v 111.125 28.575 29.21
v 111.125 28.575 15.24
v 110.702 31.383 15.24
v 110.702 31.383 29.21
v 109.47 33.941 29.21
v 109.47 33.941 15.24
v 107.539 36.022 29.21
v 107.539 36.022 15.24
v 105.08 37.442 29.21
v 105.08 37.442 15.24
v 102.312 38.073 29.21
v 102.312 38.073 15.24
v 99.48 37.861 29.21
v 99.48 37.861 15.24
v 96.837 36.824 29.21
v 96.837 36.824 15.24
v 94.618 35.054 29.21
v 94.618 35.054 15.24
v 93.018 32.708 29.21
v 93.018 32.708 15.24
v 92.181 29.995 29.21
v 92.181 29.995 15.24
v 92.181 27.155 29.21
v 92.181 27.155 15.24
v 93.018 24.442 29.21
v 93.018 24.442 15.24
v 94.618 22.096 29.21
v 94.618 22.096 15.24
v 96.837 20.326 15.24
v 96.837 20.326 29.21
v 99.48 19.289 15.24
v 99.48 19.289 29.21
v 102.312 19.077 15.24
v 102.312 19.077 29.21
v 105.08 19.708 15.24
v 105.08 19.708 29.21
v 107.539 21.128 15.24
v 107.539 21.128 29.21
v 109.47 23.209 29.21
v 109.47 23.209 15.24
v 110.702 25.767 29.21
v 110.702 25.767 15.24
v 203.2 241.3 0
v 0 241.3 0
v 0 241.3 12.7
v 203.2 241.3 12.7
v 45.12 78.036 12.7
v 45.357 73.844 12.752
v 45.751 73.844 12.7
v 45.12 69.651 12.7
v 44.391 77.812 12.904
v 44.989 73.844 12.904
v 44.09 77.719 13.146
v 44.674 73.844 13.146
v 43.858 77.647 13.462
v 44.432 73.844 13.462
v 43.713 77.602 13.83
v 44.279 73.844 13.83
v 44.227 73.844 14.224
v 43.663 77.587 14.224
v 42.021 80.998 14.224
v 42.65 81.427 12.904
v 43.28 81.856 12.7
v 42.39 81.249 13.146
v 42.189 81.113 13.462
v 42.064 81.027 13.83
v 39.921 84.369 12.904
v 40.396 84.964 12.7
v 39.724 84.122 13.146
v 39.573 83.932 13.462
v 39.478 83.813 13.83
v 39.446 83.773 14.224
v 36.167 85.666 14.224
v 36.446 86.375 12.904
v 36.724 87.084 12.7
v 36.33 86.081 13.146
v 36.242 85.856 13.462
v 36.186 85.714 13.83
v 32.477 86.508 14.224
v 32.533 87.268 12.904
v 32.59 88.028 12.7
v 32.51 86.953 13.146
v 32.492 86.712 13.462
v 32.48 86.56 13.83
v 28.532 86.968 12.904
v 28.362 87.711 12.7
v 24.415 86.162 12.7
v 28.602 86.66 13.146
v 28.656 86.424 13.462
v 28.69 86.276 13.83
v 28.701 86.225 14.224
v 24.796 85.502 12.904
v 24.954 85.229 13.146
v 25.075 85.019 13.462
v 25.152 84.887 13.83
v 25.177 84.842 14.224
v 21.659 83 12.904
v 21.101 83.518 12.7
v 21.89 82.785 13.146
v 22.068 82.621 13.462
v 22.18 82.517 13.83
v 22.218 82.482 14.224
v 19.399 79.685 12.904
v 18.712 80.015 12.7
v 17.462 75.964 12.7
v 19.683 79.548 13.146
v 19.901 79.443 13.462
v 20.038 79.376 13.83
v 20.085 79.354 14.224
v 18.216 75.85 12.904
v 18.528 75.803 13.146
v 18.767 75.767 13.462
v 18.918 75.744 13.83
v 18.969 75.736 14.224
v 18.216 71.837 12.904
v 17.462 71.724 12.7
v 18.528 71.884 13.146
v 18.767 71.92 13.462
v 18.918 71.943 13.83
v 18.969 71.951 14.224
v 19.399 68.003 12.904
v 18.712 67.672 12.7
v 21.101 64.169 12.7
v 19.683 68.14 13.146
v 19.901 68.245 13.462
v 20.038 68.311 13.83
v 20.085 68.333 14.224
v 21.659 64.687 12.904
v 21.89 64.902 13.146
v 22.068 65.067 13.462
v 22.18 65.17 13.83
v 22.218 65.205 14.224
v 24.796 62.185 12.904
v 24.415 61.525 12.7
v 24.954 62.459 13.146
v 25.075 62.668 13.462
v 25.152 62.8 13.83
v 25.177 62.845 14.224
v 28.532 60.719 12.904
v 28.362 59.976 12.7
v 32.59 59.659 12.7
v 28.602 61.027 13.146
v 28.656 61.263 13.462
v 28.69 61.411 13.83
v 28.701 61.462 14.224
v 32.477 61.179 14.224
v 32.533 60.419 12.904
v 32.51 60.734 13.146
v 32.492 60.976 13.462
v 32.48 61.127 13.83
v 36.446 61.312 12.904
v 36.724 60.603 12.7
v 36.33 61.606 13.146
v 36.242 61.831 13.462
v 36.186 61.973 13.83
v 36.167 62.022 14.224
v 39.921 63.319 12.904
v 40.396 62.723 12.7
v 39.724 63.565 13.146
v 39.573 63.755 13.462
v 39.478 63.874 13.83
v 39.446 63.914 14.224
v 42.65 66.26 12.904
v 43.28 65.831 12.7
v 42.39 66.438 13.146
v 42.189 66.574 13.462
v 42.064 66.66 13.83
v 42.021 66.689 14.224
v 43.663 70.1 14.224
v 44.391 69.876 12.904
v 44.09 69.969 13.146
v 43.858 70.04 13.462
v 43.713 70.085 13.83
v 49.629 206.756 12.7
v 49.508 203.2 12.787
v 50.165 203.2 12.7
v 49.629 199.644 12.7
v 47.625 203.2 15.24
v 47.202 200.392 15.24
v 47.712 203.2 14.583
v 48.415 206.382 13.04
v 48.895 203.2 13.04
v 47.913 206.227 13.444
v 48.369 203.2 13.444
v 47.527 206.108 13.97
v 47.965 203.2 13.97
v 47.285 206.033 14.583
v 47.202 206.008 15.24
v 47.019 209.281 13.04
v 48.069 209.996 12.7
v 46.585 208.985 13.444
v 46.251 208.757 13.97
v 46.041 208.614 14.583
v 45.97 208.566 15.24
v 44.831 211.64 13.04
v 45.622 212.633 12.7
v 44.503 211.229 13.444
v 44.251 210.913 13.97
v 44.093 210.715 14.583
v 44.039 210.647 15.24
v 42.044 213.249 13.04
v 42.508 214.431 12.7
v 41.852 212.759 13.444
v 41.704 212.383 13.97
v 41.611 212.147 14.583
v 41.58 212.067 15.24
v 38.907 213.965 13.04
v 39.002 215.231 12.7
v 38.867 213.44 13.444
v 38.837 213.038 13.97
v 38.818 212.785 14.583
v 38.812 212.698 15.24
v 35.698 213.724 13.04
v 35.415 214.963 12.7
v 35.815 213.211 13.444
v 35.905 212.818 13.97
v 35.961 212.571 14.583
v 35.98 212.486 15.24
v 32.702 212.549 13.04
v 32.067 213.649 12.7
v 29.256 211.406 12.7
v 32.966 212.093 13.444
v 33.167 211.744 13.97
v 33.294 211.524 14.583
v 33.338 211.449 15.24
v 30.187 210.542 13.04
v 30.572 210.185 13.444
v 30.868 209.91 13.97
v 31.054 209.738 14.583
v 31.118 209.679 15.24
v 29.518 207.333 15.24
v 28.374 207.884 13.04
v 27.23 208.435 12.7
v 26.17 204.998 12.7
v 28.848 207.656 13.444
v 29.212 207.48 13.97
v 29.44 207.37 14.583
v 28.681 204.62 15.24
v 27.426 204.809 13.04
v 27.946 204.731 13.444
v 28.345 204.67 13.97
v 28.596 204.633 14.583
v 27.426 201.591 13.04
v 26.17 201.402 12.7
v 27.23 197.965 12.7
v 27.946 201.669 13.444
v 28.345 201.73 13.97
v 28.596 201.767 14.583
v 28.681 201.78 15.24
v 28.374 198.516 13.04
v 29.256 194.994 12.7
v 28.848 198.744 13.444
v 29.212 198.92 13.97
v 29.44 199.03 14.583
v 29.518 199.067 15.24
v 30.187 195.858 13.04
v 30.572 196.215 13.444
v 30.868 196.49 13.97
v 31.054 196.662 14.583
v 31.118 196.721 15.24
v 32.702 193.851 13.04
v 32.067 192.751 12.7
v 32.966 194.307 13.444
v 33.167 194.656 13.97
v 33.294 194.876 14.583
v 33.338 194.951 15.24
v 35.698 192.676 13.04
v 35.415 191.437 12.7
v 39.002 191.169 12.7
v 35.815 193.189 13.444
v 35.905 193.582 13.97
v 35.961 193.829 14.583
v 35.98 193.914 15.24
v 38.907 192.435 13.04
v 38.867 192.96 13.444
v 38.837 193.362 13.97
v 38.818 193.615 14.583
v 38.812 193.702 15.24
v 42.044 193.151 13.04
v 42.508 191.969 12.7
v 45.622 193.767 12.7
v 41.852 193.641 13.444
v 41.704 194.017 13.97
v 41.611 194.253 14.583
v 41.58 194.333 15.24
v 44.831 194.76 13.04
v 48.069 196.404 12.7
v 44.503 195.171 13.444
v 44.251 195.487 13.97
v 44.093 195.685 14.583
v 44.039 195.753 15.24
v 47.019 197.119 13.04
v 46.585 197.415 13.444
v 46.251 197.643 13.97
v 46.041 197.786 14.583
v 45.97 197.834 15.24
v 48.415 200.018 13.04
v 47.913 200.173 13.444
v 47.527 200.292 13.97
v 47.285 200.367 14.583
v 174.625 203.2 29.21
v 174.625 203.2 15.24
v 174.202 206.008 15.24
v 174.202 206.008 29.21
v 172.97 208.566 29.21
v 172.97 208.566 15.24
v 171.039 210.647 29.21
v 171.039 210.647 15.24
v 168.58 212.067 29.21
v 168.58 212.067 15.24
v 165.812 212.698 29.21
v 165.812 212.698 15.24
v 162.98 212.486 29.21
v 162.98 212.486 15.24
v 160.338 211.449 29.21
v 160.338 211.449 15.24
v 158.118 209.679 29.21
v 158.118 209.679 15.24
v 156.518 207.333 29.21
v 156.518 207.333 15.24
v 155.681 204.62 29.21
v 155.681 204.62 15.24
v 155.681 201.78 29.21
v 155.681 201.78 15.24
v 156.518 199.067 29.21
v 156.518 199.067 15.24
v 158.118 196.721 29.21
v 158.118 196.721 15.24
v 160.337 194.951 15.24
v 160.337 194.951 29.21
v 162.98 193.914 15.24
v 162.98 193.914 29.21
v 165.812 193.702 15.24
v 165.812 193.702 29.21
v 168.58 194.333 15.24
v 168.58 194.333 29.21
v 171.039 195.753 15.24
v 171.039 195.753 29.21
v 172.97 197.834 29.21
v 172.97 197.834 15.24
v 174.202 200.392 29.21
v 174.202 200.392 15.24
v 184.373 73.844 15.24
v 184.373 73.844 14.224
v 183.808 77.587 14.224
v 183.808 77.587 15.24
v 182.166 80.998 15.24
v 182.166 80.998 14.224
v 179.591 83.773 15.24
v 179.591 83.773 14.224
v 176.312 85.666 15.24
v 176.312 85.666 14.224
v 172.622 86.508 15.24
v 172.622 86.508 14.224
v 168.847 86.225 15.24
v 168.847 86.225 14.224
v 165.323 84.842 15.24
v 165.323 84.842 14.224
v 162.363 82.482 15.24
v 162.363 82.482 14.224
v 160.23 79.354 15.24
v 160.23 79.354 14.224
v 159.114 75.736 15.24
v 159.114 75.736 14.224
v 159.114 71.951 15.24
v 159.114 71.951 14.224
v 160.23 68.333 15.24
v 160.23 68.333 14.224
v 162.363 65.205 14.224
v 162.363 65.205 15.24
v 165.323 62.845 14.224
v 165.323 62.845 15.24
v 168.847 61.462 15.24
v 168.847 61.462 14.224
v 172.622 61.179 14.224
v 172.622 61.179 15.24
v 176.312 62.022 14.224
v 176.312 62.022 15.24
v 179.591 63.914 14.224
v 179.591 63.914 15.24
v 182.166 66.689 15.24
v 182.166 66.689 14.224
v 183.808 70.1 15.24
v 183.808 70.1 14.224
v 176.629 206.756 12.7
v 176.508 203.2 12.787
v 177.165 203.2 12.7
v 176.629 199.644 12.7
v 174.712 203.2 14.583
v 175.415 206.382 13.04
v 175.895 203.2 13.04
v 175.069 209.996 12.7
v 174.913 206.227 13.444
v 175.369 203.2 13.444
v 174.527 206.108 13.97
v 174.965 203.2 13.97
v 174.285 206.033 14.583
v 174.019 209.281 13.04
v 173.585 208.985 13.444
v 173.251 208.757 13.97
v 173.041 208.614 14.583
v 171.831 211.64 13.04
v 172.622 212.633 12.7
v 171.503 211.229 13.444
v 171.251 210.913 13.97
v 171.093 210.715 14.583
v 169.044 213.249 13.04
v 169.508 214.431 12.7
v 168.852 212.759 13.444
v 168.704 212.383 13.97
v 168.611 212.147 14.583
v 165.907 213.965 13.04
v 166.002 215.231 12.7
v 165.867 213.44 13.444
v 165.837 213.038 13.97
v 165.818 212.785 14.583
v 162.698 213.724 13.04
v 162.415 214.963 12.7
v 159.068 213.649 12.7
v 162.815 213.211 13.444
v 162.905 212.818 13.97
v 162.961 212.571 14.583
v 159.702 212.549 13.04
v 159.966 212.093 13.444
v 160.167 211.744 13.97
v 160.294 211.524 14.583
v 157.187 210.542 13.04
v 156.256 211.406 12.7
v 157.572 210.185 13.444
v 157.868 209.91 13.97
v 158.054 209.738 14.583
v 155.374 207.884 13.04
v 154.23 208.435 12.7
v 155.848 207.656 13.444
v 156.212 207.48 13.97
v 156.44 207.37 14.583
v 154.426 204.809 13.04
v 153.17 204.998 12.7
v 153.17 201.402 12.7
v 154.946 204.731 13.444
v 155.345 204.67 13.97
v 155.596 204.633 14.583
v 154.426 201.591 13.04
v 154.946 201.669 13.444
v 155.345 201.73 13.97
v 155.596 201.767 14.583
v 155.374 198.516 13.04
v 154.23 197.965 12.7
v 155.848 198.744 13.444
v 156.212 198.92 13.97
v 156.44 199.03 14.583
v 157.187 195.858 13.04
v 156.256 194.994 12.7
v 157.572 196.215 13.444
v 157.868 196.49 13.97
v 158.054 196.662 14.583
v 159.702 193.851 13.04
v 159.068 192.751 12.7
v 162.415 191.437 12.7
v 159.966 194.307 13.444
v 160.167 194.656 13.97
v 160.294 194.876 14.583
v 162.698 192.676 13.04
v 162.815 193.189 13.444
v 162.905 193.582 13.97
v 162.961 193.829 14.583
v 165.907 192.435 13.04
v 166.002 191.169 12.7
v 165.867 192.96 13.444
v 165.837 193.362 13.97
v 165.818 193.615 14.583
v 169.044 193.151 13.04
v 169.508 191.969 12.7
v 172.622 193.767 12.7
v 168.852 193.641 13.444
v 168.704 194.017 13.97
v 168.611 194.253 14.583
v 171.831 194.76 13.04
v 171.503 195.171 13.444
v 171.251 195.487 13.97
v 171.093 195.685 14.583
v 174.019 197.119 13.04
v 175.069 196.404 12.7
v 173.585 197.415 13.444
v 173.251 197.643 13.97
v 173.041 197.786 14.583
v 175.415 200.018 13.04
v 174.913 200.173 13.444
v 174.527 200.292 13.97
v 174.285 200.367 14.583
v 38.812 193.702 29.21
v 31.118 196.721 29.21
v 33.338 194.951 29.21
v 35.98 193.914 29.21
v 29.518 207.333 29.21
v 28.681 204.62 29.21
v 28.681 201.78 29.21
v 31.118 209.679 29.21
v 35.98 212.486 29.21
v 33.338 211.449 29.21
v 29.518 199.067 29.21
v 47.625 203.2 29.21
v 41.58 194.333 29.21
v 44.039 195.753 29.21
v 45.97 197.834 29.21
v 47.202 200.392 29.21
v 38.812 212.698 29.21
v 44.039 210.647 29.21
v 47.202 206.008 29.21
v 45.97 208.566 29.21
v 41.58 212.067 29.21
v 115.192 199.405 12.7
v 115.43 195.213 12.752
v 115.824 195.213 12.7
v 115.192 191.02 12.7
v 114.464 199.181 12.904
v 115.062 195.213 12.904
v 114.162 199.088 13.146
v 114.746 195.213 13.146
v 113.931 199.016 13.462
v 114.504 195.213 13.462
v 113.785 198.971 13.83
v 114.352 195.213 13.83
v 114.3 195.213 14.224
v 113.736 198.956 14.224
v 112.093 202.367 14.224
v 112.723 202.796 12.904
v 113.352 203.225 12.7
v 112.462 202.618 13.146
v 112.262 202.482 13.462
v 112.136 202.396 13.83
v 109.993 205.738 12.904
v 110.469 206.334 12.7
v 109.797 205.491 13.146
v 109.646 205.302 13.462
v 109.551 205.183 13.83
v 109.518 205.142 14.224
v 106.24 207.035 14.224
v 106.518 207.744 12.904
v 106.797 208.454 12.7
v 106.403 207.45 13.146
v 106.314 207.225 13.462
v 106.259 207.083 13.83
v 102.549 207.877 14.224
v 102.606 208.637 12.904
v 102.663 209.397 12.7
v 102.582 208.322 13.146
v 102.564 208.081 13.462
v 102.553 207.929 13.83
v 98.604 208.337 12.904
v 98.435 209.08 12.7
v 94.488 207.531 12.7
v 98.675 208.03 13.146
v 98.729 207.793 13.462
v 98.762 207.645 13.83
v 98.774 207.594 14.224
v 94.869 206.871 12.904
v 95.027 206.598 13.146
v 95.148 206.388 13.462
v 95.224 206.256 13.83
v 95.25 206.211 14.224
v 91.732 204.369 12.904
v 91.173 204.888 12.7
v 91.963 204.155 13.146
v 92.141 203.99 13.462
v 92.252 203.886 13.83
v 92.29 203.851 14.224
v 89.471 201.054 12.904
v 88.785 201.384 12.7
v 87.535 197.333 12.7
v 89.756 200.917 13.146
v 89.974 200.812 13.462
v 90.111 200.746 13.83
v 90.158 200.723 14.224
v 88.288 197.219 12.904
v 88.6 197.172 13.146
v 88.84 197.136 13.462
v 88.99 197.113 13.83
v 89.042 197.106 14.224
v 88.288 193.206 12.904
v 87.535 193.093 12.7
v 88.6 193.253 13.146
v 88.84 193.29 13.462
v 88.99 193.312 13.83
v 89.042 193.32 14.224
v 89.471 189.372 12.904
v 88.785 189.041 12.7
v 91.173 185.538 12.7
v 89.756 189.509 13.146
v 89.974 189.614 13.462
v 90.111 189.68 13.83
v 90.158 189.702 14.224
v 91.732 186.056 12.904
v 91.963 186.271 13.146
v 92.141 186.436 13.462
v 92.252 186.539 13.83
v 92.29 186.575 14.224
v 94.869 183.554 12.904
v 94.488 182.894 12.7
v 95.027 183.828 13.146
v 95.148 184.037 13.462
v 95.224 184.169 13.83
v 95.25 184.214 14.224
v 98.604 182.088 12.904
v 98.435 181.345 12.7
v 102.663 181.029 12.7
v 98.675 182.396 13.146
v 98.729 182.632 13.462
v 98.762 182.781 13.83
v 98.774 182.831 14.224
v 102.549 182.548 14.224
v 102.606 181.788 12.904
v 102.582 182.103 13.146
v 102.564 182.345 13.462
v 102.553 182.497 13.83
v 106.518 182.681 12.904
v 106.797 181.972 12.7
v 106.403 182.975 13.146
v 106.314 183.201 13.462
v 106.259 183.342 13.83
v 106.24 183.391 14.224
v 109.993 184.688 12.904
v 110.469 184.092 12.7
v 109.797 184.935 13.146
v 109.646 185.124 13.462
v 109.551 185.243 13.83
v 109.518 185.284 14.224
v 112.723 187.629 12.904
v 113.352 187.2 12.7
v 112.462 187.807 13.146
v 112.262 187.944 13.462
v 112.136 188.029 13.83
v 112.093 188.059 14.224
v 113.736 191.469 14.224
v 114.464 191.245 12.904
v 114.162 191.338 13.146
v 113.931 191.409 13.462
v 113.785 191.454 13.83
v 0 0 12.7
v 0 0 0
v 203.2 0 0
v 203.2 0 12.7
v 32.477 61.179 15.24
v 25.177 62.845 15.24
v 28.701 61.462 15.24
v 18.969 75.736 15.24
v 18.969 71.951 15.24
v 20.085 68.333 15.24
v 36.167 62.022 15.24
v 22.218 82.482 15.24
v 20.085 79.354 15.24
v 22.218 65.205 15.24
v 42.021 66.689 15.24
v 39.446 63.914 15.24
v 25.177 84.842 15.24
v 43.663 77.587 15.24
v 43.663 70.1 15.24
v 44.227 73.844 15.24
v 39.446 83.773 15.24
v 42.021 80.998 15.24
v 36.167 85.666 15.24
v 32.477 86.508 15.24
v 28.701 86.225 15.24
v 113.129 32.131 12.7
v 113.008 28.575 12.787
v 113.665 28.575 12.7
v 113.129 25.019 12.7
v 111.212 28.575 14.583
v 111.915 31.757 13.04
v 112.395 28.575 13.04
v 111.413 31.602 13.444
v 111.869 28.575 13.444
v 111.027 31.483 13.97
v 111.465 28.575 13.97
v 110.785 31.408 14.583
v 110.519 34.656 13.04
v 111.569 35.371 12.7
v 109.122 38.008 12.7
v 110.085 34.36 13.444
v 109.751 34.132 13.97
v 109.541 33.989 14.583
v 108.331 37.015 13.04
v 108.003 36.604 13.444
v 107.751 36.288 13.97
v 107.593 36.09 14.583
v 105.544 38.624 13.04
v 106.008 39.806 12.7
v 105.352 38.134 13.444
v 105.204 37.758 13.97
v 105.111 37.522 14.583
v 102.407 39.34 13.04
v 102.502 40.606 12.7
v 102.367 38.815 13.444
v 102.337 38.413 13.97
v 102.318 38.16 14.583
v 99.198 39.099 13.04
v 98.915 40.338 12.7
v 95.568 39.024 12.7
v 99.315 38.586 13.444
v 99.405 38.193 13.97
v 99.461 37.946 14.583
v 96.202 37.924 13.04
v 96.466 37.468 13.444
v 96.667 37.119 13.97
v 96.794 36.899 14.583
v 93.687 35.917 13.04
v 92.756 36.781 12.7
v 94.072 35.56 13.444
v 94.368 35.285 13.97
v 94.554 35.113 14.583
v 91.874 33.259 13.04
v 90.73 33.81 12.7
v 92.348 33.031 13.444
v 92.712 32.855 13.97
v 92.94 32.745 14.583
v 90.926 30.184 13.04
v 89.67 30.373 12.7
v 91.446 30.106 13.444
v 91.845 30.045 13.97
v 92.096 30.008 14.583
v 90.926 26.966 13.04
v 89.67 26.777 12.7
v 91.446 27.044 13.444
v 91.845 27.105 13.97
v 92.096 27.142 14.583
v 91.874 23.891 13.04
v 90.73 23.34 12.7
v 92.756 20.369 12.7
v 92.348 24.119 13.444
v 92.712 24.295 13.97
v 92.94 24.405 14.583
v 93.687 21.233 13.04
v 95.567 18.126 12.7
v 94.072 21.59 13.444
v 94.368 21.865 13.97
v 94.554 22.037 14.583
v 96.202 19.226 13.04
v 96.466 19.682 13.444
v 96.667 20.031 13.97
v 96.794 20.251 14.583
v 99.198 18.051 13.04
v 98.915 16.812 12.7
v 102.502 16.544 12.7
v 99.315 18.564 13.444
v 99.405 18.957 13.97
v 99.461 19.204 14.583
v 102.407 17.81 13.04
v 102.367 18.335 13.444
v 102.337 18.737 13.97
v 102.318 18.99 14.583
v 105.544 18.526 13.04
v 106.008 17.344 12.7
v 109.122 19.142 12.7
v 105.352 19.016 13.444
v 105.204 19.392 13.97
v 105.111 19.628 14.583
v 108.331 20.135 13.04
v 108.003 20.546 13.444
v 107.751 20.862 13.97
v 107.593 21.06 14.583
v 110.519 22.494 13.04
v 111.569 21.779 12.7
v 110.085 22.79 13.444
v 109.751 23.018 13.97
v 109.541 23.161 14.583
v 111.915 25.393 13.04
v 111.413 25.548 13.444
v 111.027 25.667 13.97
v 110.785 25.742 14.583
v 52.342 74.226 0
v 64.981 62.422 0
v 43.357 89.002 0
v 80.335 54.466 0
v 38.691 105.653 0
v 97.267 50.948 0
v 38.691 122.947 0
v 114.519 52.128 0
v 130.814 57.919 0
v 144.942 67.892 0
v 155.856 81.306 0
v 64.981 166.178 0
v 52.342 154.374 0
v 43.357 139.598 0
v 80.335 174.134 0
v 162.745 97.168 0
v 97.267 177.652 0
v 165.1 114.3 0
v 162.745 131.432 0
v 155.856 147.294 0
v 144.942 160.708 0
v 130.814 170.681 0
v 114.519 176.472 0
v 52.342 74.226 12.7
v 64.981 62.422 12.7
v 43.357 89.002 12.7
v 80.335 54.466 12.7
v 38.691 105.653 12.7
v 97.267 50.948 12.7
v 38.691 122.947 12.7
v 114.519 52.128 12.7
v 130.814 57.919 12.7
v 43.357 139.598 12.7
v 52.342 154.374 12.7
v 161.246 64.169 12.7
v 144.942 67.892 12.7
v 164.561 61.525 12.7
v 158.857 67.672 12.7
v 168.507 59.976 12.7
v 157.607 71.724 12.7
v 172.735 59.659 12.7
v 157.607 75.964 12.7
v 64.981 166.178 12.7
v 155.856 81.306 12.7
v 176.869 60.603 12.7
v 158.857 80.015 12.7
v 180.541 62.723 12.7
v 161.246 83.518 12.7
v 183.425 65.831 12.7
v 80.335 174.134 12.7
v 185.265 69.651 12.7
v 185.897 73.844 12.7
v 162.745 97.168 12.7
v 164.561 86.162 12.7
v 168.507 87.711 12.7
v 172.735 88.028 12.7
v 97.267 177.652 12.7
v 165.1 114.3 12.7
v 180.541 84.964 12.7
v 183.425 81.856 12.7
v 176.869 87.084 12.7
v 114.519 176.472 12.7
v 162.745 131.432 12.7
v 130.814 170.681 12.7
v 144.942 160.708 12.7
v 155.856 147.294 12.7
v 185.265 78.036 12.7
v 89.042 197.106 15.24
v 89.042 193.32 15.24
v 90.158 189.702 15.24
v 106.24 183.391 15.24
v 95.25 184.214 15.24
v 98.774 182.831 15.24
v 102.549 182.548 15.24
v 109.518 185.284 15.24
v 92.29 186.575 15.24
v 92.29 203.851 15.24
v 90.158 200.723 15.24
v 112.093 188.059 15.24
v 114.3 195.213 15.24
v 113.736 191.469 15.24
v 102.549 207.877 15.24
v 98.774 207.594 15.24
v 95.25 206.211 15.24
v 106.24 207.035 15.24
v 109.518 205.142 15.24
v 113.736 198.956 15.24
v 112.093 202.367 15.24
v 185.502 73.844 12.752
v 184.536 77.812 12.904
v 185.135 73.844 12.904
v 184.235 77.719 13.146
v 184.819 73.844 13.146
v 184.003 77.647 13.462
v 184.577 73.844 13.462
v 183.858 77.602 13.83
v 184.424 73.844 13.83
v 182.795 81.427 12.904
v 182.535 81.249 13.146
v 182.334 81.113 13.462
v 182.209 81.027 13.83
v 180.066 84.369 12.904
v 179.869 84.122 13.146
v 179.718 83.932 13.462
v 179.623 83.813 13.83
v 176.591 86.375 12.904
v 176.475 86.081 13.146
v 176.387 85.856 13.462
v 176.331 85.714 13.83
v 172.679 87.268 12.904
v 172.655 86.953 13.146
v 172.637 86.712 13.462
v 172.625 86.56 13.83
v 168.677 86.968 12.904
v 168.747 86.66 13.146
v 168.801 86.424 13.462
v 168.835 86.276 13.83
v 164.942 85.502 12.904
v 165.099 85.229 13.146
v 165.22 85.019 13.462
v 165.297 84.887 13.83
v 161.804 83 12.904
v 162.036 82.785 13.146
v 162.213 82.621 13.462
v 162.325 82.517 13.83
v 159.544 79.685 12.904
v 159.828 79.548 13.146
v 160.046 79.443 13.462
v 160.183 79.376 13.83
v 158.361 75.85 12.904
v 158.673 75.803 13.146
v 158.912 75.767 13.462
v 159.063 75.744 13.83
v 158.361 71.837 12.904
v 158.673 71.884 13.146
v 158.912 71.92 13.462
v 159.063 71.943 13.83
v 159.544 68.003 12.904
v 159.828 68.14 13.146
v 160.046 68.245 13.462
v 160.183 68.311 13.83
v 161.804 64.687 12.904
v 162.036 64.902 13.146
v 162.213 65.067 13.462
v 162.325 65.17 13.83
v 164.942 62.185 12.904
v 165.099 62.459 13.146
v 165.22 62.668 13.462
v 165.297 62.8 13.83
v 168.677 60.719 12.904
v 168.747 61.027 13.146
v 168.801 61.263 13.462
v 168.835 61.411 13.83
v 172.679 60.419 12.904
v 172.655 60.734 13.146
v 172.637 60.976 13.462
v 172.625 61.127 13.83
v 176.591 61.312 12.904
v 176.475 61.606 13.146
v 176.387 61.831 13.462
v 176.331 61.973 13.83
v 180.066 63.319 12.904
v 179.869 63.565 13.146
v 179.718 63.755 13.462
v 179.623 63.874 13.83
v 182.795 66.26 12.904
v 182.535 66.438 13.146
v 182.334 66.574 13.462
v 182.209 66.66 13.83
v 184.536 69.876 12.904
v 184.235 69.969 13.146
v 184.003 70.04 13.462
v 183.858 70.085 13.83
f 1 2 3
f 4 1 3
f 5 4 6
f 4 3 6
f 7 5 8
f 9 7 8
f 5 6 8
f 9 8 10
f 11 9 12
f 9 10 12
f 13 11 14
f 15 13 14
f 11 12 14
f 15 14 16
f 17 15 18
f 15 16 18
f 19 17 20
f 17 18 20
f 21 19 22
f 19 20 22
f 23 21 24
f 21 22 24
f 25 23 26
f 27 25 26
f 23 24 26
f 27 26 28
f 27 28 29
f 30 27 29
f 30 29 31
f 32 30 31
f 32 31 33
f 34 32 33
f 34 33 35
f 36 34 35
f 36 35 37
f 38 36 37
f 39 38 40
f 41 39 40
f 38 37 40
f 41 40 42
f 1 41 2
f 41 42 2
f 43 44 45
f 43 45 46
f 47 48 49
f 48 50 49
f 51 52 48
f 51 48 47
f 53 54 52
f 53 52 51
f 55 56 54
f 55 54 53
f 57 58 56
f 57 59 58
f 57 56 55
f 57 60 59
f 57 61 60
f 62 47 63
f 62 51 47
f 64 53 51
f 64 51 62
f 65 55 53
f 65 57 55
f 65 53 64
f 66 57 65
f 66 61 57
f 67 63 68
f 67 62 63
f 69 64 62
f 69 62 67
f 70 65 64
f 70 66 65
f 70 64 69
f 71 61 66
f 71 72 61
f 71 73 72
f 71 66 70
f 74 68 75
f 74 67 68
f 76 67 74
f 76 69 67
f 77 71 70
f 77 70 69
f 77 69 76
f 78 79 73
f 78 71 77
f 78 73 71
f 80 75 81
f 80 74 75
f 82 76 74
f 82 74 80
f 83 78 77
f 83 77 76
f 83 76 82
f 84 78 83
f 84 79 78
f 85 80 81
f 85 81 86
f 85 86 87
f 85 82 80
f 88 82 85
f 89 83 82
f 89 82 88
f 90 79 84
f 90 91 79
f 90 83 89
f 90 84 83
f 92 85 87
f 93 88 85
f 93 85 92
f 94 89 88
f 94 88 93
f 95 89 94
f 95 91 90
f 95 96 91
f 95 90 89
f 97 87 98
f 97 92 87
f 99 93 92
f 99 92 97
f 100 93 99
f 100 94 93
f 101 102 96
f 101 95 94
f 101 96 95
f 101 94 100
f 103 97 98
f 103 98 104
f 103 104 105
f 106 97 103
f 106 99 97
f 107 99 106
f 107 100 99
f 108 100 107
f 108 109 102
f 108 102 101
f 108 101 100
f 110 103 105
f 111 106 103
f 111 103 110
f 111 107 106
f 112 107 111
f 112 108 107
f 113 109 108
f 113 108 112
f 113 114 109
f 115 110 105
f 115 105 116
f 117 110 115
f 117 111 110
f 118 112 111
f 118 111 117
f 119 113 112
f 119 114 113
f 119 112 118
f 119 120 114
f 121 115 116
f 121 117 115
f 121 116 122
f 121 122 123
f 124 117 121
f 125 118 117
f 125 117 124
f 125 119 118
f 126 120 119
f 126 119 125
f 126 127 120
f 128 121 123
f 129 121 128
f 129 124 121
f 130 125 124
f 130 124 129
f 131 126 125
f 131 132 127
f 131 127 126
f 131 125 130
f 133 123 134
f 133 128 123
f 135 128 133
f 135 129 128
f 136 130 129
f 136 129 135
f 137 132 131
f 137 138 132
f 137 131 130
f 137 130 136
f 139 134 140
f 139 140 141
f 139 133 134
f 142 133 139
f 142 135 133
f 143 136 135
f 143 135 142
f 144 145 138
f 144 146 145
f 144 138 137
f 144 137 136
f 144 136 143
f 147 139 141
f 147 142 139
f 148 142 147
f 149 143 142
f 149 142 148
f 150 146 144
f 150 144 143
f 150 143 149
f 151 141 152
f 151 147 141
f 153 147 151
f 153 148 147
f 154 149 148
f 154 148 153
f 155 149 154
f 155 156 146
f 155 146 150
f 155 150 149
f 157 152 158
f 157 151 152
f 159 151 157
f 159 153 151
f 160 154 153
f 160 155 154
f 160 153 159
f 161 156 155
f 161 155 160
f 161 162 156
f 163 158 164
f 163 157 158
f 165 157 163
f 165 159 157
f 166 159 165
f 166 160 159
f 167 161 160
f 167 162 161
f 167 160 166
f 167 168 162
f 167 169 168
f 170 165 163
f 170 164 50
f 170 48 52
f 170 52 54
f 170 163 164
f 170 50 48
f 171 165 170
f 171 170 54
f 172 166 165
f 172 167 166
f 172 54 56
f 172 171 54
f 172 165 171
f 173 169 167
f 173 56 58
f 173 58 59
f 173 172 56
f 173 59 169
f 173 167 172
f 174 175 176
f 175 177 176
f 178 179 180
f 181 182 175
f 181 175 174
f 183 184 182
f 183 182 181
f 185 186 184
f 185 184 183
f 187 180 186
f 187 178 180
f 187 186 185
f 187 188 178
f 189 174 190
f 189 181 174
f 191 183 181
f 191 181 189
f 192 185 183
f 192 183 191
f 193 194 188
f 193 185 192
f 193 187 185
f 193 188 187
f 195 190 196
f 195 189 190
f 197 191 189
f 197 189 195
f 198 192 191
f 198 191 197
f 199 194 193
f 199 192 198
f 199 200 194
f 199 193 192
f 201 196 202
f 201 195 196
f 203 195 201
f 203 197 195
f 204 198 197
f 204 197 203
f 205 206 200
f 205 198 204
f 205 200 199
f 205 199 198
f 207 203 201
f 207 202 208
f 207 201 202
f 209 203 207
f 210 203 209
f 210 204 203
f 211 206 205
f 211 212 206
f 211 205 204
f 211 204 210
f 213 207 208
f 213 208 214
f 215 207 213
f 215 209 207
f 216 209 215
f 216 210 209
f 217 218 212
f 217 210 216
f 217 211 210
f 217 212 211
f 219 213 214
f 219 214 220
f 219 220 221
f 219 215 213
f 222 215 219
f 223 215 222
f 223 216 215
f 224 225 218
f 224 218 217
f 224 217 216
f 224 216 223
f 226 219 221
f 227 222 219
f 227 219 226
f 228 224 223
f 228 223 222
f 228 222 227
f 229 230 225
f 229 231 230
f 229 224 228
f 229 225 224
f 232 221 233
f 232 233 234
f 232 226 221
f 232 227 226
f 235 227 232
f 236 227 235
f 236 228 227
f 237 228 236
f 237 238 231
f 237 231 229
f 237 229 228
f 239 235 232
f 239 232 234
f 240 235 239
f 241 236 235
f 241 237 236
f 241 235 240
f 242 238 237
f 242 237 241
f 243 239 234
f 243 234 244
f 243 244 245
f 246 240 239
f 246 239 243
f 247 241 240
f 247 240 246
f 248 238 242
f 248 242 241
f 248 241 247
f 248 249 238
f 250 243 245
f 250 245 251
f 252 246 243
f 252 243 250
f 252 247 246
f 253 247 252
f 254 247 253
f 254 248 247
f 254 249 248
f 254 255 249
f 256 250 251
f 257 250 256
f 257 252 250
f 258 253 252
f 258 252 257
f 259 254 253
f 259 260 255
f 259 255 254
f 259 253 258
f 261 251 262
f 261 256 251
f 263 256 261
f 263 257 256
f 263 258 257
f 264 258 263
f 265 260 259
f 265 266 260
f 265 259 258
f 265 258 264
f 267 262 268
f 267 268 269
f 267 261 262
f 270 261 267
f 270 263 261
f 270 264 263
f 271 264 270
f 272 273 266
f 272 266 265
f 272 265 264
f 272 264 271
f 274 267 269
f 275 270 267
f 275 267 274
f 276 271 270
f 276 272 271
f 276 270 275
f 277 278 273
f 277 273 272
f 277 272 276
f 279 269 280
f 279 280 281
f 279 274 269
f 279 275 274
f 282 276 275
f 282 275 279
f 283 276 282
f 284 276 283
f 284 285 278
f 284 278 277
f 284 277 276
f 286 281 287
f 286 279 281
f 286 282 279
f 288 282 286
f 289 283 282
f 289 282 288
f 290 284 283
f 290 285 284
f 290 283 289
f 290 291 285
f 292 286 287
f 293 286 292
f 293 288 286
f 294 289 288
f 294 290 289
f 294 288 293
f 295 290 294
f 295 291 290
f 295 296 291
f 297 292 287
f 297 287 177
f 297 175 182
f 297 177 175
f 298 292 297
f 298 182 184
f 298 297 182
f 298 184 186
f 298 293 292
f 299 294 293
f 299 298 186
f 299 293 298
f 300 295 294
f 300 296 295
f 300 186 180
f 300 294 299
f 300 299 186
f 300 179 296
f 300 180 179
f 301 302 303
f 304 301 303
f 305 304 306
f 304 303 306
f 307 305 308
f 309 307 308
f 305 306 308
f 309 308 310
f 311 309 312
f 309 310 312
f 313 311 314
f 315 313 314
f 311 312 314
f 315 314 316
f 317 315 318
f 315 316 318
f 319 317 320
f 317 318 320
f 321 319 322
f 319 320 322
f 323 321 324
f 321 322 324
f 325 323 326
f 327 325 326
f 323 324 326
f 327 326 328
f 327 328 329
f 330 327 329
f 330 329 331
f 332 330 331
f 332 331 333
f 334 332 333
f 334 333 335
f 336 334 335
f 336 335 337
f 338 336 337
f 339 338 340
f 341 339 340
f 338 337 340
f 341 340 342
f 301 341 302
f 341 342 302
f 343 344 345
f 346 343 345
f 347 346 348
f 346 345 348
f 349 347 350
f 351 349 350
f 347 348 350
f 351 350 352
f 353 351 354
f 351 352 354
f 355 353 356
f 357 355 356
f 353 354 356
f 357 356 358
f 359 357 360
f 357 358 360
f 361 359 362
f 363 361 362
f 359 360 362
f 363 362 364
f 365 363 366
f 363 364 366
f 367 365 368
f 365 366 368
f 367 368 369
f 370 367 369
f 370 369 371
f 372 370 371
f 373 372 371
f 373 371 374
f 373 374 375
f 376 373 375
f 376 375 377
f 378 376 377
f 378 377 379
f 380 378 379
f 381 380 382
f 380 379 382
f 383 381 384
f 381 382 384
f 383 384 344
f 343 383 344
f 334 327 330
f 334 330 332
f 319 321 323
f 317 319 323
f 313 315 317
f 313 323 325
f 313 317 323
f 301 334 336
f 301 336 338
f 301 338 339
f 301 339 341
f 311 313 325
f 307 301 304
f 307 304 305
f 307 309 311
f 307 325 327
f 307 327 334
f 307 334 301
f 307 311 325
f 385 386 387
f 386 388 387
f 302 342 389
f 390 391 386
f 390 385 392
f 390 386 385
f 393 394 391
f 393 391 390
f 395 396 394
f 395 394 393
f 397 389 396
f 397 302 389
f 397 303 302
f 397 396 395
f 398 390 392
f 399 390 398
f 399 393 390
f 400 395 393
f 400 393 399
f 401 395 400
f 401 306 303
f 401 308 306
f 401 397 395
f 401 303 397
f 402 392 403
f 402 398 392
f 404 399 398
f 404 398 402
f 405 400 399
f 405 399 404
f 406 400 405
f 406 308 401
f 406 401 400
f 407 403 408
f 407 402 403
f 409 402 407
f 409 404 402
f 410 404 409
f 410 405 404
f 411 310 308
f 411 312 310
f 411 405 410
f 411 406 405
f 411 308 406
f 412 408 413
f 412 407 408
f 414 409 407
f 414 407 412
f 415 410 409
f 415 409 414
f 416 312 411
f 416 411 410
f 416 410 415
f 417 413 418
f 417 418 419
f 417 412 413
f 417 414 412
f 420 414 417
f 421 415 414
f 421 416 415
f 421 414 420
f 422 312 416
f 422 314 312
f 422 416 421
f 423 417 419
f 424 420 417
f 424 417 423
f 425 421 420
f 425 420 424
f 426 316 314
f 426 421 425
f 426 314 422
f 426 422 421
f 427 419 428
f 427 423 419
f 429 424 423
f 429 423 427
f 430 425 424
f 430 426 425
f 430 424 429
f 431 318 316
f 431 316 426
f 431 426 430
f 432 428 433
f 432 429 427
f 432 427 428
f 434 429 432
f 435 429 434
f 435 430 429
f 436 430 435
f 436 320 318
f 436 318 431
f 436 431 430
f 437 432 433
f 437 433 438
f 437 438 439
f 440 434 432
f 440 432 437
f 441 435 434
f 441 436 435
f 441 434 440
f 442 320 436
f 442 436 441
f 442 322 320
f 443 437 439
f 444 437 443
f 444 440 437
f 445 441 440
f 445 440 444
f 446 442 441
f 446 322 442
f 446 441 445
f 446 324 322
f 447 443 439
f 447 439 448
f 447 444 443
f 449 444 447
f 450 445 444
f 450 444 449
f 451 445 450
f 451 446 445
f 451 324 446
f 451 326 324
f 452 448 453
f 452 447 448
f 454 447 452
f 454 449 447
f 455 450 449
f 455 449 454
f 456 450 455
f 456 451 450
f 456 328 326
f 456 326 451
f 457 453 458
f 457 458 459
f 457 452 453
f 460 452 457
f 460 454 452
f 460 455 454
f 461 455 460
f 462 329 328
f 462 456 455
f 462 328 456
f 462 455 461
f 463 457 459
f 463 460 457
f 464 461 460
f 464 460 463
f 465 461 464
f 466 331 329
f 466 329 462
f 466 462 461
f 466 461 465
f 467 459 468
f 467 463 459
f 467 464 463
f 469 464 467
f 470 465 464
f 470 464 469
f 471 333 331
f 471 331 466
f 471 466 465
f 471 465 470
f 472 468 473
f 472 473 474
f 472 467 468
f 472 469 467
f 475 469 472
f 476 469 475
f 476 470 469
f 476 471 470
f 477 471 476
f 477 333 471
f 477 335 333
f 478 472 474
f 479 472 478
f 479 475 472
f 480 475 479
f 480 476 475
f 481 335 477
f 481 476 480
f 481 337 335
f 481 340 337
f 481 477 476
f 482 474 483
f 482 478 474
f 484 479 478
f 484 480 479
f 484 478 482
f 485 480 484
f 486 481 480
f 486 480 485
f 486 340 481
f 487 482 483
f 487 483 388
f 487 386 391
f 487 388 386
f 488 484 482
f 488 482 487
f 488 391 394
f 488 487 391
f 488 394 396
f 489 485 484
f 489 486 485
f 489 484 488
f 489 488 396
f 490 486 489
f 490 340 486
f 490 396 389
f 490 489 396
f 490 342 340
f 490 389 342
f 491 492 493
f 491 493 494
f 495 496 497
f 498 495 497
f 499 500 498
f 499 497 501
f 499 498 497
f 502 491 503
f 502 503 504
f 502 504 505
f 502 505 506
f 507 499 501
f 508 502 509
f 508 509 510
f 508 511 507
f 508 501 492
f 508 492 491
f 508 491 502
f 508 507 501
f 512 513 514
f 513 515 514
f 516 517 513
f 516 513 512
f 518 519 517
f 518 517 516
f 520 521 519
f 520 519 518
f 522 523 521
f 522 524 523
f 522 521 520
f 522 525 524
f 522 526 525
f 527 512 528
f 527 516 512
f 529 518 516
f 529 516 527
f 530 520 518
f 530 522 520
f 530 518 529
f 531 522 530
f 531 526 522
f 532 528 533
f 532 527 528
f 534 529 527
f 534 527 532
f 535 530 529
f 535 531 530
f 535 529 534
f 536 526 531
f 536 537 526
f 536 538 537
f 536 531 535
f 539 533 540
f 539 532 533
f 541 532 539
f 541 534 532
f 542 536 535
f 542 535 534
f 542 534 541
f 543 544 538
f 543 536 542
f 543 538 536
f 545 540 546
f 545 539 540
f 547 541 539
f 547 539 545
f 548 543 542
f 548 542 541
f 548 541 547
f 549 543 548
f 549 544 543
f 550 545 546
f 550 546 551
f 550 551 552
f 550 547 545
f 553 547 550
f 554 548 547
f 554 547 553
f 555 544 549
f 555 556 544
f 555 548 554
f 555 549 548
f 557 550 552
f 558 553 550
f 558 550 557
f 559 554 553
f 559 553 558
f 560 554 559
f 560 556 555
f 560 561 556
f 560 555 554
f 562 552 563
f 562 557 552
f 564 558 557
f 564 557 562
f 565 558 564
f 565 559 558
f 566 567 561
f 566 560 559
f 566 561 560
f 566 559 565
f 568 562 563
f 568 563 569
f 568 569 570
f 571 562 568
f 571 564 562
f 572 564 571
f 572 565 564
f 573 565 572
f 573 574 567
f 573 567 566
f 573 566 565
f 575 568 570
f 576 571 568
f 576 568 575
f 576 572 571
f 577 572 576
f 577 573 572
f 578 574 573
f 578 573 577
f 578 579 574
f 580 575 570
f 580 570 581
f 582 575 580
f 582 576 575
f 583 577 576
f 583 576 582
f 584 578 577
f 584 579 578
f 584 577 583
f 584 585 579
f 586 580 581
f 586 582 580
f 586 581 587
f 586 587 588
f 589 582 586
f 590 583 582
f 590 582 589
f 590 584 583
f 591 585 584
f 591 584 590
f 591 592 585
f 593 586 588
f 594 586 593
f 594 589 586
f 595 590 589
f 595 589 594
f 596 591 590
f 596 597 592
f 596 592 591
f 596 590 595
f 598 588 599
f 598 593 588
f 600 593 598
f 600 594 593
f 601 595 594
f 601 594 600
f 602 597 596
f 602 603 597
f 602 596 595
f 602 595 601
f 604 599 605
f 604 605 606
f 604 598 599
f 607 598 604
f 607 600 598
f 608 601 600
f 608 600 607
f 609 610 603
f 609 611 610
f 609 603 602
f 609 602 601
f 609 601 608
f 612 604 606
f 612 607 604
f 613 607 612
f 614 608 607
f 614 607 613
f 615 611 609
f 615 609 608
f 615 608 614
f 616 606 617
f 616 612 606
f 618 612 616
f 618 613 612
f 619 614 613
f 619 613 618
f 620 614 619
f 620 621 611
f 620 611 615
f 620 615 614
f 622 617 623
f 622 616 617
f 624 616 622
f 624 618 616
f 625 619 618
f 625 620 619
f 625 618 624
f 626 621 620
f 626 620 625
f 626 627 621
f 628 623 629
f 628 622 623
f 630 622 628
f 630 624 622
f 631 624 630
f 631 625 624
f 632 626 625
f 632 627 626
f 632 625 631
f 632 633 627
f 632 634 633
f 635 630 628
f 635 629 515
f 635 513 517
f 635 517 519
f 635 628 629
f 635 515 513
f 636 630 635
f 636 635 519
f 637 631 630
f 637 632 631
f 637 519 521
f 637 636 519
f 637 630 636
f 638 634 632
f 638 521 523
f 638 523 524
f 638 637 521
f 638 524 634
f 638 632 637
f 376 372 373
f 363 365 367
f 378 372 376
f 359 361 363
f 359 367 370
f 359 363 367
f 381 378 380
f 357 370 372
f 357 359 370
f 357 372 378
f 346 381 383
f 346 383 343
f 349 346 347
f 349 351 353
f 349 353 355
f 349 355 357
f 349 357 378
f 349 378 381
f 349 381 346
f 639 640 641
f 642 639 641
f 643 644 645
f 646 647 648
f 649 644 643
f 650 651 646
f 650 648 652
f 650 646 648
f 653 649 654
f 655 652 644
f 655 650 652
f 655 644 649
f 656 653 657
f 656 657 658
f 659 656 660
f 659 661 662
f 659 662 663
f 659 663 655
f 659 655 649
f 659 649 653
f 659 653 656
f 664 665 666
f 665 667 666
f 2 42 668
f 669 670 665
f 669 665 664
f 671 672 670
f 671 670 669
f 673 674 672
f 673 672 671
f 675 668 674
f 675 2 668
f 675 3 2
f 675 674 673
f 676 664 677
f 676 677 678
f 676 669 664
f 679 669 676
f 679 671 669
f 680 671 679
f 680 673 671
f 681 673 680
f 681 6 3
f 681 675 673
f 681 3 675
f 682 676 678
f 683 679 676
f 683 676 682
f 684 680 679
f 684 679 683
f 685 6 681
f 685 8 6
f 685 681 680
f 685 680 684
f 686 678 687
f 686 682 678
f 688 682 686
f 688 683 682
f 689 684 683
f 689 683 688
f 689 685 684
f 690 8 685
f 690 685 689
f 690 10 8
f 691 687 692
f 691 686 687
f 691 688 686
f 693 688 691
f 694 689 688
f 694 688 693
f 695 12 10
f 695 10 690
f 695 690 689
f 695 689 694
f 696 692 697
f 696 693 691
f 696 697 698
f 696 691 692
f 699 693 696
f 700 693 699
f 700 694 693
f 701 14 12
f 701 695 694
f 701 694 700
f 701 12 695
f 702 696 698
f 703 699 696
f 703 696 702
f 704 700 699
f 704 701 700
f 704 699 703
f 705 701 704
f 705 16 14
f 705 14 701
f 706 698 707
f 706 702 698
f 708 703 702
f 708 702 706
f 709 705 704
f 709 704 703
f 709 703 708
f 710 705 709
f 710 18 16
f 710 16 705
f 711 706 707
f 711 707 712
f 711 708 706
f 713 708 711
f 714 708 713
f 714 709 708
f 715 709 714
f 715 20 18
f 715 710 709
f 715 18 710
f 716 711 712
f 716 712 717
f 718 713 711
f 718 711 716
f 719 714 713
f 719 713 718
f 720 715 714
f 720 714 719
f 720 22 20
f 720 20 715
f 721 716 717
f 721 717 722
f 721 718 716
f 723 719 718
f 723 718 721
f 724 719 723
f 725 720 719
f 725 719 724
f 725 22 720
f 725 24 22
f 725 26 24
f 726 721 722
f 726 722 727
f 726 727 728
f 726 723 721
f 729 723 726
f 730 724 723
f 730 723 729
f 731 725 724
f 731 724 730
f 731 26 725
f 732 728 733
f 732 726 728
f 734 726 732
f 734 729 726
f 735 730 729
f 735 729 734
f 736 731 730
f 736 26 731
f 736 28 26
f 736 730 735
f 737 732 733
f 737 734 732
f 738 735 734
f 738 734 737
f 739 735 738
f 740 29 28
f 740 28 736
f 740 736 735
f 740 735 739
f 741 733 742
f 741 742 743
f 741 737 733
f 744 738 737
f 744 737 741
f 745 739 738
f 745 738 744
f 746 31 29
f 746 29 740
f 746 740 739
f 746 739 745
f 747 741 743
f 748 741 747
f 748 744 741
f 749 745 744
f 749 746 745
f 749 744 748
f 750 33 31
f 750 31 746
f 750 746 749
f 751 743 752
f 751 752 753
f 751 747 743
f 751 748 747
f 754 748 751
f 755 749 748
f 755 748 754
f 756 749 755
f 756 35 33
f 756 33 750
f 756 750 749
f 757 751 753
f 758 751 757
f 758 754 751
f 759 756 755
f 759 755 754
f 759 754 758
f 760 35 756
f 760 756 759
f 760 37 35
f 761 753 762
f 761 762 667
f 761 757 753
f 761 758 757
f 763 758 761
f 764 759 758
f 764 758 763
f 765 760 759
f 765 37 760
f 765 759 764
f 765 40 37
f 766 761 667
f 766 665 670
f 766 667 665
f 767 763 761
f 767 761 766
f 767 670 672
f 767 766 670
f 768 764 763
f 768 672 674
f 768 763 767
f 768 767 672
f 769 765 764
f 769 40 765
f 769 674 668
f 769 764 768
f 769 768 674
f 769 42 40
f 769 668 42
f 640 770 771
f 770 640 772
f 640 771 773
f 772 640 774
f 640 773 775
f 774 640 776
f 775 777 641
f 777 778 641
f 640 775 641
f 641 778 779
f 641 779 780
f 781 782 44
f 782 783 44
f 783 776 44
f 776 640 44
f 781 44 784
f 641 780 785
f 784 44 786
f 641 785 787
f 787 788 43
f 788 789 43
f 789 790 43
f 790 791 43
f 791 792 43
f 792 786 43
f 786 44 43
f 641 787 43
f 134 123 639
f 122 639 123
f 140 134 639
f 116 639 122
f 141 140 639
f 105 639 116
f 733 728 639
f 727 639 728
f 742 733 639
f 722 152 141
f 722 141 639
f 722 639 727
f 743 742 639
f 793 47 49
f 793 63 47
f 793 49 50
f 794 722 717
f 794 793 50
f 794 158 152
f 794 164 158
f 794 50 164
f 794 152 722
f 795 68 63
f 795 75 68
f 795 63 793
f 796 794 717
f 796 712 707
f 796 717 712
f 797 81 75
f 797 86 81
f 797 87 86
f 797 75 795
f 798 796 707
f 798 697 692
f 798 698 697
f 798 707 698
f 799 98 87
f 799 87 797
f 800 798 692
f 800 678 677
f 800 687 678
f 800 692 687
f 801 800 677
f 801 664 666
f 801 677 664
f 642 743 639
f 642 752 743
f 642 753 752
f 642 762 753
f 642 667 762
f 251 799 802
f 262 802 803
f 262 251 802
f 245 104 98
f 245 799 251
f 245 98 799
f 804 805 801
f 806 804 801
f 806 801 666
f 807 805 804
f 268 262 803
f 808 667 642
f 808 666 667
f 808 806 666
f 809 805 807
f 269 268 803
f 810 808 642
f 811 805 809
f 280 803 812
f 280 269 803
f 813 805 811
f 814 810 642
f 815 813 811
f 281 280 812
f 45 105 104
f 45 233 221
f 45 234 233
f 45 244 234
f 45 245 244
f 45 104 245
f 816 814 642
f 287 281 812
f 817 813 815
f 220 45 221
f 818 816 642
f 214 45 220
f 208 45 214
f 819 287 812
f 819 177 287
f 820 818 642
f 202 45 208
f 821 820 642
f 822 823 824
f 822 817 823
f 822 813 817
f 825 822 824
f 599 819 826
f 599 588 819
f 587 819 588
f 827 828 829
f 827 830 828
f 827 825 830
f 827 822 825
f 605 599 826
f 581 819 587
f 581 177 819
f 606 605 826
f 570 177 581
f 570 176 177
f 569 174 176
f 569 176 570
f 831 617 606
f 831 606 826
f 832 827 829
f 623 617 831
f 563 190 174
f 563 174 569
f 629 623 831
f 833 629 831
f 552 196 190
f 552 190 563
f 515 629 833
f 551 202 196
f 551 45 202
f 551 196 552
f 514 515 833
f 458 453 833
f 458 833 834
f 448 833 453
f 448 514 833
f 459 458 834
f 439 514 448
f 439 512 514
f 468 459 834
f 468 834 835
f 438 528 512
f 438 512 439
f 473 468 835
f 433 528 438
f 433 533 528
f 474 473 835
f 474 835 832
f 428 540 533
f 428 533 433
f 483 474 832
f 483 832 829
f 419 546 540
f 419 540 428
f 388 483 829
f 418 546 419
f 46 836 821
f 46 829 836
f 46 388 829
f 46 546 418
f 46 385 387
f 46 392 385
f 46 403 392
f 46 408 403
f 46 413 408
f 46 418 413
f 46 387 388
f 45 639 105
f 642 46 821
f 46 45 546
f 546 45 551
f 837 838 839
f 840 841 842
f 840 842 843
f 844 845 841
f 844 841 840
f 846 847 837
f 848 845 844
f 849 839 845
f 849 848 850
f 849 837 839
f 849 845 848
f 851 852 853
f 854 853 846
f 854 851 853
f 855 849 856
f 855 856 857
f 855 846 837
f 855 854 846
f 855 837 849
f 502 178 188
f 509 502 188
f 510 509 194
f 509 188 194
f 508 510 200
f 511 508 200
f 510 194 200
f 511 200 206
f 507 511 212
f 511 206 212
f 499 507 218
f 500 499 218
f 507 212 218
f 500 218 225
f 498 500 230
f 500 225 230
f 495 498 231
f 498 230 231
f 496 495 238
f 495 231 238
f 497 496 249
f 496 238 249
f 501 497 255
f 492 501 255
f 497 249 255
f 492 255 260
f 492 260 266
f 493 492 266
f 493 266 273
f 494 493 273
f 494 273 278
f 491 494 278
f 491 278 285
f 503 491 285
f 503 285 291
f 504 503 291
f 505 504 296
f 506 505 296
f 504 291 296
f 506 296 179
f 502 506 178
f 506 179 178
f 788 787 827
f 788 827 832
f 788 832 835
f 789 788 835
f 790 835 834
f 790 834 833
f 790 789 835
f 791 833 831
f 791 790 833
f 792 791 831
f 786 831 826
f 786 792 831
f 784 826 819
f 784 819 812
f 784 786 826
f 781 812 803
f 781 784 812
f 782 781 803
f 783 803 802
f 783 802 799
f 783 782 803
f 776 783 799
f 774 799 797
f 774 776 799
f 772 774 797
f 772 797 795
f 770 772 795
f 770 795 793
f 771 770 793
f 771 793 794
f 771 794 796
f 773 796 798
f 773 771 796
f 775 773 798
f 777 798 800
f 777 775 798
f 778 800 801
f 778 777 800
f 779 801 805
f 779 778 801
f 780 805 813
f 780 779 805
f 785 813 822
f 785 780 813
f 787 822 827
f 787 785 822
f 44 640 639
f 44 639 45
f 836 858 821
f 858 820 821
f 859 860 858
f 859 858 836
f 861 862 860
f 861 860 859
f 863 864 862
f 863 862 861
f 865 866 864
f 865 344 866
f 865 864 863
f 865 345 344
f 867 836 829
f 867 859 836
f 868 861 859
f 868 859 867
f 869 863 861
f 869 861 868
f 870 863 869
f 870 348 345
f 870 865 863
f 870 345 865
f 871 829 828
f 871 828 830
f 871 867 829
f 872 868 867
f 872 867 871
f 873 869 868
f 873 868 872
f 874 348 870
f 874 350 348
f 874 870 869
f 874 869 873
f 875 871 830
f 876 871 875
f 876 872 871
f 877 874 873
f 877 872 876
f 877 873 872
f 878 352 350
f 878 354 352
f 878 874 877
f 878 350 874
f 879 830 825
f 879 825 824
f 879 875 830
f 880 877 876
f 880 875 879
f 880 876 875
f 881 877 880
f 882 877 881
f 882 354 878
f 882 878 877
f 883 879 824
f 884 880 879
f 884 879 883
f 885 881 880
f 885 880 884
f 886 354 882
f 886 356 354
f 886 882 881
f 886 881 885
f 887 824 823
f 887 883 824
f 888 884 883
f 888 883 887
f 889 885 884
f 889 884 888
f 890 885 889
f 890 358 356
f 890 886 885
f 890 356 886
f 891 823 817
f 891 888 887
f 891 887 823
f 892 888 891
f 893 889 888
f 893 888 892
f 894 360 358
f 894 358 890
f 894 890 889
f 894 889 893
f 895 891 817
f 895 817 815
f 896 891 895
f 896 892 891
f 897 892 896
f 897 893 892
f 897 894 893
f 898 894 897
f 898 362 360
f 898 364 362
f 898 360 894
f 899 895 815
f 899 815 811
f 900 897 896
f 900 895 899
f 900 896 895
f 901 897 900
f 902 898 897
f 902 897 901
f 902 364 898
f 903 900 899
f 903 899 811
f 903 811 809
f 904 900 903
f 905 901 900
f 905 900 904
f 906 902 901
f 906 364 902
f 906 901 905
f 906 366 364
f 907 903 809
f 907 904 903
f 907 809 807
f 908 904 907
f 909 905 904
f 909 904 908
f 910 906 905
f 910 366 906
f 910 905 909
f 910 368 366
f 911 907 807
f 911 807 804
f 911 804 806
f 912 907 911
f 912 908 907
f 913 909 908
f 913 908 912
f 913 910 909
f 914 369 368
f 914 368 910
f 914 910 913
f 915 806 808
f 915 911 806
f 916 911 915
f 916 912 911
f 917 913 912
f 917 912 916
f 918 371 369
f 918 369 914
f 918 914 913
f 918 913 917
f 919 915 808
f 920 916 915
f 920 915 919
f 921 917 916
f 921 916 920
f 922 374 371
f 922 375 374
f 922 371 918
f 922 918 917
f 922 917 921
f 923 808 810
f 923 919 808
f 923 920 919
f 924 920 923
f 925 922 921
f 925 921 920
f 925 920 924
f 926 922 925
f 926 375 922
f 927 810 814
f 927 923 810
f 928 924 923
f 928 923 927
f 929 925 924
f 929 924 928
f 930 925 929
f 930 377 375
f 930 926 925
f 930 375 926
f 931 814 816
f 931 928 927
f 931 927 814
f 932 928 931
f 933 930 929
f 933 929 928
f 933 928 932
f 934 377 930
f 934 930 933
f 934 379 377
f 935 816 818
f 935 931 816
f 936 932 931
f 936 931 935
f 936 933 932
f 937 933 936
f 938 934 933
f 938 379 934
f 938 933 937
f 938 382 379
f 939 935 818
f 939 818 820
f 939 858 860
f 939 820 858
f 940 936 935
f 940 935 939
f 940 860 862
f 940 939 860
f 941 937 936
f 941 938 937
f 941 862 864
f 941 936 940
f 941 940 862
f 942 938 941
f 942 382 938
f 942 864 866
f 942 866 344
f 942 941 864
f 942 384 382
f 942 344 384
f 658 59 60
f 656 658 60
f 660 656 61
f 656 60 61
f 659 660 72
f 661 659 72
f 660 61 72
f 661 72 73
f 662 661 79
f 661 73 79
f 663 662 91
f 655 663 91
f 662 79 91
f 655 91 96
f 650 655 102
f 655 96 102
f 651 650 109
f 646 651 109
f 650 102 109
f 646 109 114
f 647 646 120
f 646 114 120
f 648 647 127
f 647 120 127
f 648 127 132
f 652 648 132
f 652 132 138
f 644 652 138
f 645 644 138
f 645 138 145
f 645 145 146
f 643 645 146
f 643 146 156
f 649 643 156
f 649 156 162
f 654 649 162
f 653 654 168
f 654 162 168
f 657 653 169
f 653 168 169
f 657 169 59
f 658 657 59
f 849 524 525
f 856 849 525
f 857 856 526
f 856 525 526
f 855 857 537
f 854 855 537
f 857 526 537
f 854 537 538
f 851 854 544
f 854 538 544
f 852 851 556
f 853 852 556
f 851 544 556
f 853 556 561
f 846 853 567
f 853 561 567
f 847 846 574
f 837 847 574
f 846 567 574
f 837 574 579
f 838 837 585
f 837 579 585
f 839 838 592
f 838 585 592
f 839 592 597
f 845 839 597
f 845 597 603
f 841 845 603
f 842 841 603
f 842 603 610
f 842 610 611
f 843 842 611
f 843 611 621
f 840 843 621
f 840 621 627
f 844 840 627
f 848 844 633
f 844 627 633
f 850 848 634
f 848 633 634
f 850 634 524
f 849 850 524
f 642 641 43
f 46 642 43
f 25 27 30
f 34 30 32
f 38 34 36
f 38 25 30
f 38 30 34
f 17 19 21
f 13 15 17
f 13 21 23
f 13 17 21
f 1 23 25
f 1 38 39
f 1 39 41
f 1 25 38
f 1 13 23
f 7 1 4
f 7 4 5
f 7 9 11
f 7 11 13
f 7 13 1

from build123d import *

# Parameters (mm, degrees)
SKETCH1_W           = 203.2
SKETCH1_H           = 241.3
SKETCH1_R           = 63.5
BASE_EXTRUDE_DEPTH  = 12.7
SKETCH3_R           = 12.7
BOSS_EXTRUDE2_DEPTH = 2.54
SKETCH4_R           = 9.525
BOSS_EXTRUDE4_DEPTH = 16.51
SKETCH5_R           = 9.525
BOSS_EXTRUDE5_DEPTH = 16.51
FILLET4_R           = 2.54
FILLET5_R           = 1.524


with BuildPart() as part:
    # Sketch1 → Base-Extrude (new body)
    with BuildSketch(Plane.XY):
        with Locations((101.6, 120.65)):
            Rectangle(SKETCH1_W, SKETCH1_H)
        with Locations((101.6, 114.3)):
            Circle(SKETCH1_R, mode=Mode.SUBTRACT)
    extrude(amount=BASE_EXTRUDE_DEPTH)

    # Sketch3 → Boss-Extrude2 (add)
    with BuildSketch(Plane.XY.offset(12.7)):
        with Locations((31.527468808, 73.843605253)):
            Circle(SKETCH3_R)
        with Locations((101.6, 195.212789493)):
            Circle(SKETCH3_R)
        with Locations((171.672531192, 73.843605253)):
            Circle(SKETCH3_R)
    extrude(amount=BOSS_EXTRUDE2_DEPTH)

    # Sketch4 → Boss-Extrude4 (add)
    with BuildSketch(Plane.XY.offset(12.7)):
        with Locations((38.1, 203.2)):
            Circle(SKETCH4_R)
        with Locations((165.1, 203.2)):
            Circle(SKETCH4_R)
    extrude(amount=BOSS_EXTRUDE4_DEPTH)

    # Sketch5 → Boss-Extrude5 (add)
    with BuildSketch(Plane.XY.offset(12.7)):
        with Locations((101.6, 28.575)):
            Circle(SKETCH5_R)
    extrude(amount=BOSS_EXTRUDE5_DEPTH)

    # Fillet4
    fillet4_edges = [part.edges().sort_by_distance(p)[0] for p in [
        (28.575, 203.2, 12.7),
        (155.575, 203.2, 12.7),
        (92.075, 28.575, 12.7),
    ]]
    fillet(fillet4_edges, radius=FILLET4_R)

    # Fillet5
    fillet5_edges = [part.edges().sort_by_distance(p)[0] for p in [
        (18.827468808, 73.843605253, 12.7),
        (88.9, 195.212789493, 12.7),
        (158.972531192, 73.843605253, 12.7),
    ]]
    fillet(fillet5_edges, radius=FILLET5_R)


solid = part.part
